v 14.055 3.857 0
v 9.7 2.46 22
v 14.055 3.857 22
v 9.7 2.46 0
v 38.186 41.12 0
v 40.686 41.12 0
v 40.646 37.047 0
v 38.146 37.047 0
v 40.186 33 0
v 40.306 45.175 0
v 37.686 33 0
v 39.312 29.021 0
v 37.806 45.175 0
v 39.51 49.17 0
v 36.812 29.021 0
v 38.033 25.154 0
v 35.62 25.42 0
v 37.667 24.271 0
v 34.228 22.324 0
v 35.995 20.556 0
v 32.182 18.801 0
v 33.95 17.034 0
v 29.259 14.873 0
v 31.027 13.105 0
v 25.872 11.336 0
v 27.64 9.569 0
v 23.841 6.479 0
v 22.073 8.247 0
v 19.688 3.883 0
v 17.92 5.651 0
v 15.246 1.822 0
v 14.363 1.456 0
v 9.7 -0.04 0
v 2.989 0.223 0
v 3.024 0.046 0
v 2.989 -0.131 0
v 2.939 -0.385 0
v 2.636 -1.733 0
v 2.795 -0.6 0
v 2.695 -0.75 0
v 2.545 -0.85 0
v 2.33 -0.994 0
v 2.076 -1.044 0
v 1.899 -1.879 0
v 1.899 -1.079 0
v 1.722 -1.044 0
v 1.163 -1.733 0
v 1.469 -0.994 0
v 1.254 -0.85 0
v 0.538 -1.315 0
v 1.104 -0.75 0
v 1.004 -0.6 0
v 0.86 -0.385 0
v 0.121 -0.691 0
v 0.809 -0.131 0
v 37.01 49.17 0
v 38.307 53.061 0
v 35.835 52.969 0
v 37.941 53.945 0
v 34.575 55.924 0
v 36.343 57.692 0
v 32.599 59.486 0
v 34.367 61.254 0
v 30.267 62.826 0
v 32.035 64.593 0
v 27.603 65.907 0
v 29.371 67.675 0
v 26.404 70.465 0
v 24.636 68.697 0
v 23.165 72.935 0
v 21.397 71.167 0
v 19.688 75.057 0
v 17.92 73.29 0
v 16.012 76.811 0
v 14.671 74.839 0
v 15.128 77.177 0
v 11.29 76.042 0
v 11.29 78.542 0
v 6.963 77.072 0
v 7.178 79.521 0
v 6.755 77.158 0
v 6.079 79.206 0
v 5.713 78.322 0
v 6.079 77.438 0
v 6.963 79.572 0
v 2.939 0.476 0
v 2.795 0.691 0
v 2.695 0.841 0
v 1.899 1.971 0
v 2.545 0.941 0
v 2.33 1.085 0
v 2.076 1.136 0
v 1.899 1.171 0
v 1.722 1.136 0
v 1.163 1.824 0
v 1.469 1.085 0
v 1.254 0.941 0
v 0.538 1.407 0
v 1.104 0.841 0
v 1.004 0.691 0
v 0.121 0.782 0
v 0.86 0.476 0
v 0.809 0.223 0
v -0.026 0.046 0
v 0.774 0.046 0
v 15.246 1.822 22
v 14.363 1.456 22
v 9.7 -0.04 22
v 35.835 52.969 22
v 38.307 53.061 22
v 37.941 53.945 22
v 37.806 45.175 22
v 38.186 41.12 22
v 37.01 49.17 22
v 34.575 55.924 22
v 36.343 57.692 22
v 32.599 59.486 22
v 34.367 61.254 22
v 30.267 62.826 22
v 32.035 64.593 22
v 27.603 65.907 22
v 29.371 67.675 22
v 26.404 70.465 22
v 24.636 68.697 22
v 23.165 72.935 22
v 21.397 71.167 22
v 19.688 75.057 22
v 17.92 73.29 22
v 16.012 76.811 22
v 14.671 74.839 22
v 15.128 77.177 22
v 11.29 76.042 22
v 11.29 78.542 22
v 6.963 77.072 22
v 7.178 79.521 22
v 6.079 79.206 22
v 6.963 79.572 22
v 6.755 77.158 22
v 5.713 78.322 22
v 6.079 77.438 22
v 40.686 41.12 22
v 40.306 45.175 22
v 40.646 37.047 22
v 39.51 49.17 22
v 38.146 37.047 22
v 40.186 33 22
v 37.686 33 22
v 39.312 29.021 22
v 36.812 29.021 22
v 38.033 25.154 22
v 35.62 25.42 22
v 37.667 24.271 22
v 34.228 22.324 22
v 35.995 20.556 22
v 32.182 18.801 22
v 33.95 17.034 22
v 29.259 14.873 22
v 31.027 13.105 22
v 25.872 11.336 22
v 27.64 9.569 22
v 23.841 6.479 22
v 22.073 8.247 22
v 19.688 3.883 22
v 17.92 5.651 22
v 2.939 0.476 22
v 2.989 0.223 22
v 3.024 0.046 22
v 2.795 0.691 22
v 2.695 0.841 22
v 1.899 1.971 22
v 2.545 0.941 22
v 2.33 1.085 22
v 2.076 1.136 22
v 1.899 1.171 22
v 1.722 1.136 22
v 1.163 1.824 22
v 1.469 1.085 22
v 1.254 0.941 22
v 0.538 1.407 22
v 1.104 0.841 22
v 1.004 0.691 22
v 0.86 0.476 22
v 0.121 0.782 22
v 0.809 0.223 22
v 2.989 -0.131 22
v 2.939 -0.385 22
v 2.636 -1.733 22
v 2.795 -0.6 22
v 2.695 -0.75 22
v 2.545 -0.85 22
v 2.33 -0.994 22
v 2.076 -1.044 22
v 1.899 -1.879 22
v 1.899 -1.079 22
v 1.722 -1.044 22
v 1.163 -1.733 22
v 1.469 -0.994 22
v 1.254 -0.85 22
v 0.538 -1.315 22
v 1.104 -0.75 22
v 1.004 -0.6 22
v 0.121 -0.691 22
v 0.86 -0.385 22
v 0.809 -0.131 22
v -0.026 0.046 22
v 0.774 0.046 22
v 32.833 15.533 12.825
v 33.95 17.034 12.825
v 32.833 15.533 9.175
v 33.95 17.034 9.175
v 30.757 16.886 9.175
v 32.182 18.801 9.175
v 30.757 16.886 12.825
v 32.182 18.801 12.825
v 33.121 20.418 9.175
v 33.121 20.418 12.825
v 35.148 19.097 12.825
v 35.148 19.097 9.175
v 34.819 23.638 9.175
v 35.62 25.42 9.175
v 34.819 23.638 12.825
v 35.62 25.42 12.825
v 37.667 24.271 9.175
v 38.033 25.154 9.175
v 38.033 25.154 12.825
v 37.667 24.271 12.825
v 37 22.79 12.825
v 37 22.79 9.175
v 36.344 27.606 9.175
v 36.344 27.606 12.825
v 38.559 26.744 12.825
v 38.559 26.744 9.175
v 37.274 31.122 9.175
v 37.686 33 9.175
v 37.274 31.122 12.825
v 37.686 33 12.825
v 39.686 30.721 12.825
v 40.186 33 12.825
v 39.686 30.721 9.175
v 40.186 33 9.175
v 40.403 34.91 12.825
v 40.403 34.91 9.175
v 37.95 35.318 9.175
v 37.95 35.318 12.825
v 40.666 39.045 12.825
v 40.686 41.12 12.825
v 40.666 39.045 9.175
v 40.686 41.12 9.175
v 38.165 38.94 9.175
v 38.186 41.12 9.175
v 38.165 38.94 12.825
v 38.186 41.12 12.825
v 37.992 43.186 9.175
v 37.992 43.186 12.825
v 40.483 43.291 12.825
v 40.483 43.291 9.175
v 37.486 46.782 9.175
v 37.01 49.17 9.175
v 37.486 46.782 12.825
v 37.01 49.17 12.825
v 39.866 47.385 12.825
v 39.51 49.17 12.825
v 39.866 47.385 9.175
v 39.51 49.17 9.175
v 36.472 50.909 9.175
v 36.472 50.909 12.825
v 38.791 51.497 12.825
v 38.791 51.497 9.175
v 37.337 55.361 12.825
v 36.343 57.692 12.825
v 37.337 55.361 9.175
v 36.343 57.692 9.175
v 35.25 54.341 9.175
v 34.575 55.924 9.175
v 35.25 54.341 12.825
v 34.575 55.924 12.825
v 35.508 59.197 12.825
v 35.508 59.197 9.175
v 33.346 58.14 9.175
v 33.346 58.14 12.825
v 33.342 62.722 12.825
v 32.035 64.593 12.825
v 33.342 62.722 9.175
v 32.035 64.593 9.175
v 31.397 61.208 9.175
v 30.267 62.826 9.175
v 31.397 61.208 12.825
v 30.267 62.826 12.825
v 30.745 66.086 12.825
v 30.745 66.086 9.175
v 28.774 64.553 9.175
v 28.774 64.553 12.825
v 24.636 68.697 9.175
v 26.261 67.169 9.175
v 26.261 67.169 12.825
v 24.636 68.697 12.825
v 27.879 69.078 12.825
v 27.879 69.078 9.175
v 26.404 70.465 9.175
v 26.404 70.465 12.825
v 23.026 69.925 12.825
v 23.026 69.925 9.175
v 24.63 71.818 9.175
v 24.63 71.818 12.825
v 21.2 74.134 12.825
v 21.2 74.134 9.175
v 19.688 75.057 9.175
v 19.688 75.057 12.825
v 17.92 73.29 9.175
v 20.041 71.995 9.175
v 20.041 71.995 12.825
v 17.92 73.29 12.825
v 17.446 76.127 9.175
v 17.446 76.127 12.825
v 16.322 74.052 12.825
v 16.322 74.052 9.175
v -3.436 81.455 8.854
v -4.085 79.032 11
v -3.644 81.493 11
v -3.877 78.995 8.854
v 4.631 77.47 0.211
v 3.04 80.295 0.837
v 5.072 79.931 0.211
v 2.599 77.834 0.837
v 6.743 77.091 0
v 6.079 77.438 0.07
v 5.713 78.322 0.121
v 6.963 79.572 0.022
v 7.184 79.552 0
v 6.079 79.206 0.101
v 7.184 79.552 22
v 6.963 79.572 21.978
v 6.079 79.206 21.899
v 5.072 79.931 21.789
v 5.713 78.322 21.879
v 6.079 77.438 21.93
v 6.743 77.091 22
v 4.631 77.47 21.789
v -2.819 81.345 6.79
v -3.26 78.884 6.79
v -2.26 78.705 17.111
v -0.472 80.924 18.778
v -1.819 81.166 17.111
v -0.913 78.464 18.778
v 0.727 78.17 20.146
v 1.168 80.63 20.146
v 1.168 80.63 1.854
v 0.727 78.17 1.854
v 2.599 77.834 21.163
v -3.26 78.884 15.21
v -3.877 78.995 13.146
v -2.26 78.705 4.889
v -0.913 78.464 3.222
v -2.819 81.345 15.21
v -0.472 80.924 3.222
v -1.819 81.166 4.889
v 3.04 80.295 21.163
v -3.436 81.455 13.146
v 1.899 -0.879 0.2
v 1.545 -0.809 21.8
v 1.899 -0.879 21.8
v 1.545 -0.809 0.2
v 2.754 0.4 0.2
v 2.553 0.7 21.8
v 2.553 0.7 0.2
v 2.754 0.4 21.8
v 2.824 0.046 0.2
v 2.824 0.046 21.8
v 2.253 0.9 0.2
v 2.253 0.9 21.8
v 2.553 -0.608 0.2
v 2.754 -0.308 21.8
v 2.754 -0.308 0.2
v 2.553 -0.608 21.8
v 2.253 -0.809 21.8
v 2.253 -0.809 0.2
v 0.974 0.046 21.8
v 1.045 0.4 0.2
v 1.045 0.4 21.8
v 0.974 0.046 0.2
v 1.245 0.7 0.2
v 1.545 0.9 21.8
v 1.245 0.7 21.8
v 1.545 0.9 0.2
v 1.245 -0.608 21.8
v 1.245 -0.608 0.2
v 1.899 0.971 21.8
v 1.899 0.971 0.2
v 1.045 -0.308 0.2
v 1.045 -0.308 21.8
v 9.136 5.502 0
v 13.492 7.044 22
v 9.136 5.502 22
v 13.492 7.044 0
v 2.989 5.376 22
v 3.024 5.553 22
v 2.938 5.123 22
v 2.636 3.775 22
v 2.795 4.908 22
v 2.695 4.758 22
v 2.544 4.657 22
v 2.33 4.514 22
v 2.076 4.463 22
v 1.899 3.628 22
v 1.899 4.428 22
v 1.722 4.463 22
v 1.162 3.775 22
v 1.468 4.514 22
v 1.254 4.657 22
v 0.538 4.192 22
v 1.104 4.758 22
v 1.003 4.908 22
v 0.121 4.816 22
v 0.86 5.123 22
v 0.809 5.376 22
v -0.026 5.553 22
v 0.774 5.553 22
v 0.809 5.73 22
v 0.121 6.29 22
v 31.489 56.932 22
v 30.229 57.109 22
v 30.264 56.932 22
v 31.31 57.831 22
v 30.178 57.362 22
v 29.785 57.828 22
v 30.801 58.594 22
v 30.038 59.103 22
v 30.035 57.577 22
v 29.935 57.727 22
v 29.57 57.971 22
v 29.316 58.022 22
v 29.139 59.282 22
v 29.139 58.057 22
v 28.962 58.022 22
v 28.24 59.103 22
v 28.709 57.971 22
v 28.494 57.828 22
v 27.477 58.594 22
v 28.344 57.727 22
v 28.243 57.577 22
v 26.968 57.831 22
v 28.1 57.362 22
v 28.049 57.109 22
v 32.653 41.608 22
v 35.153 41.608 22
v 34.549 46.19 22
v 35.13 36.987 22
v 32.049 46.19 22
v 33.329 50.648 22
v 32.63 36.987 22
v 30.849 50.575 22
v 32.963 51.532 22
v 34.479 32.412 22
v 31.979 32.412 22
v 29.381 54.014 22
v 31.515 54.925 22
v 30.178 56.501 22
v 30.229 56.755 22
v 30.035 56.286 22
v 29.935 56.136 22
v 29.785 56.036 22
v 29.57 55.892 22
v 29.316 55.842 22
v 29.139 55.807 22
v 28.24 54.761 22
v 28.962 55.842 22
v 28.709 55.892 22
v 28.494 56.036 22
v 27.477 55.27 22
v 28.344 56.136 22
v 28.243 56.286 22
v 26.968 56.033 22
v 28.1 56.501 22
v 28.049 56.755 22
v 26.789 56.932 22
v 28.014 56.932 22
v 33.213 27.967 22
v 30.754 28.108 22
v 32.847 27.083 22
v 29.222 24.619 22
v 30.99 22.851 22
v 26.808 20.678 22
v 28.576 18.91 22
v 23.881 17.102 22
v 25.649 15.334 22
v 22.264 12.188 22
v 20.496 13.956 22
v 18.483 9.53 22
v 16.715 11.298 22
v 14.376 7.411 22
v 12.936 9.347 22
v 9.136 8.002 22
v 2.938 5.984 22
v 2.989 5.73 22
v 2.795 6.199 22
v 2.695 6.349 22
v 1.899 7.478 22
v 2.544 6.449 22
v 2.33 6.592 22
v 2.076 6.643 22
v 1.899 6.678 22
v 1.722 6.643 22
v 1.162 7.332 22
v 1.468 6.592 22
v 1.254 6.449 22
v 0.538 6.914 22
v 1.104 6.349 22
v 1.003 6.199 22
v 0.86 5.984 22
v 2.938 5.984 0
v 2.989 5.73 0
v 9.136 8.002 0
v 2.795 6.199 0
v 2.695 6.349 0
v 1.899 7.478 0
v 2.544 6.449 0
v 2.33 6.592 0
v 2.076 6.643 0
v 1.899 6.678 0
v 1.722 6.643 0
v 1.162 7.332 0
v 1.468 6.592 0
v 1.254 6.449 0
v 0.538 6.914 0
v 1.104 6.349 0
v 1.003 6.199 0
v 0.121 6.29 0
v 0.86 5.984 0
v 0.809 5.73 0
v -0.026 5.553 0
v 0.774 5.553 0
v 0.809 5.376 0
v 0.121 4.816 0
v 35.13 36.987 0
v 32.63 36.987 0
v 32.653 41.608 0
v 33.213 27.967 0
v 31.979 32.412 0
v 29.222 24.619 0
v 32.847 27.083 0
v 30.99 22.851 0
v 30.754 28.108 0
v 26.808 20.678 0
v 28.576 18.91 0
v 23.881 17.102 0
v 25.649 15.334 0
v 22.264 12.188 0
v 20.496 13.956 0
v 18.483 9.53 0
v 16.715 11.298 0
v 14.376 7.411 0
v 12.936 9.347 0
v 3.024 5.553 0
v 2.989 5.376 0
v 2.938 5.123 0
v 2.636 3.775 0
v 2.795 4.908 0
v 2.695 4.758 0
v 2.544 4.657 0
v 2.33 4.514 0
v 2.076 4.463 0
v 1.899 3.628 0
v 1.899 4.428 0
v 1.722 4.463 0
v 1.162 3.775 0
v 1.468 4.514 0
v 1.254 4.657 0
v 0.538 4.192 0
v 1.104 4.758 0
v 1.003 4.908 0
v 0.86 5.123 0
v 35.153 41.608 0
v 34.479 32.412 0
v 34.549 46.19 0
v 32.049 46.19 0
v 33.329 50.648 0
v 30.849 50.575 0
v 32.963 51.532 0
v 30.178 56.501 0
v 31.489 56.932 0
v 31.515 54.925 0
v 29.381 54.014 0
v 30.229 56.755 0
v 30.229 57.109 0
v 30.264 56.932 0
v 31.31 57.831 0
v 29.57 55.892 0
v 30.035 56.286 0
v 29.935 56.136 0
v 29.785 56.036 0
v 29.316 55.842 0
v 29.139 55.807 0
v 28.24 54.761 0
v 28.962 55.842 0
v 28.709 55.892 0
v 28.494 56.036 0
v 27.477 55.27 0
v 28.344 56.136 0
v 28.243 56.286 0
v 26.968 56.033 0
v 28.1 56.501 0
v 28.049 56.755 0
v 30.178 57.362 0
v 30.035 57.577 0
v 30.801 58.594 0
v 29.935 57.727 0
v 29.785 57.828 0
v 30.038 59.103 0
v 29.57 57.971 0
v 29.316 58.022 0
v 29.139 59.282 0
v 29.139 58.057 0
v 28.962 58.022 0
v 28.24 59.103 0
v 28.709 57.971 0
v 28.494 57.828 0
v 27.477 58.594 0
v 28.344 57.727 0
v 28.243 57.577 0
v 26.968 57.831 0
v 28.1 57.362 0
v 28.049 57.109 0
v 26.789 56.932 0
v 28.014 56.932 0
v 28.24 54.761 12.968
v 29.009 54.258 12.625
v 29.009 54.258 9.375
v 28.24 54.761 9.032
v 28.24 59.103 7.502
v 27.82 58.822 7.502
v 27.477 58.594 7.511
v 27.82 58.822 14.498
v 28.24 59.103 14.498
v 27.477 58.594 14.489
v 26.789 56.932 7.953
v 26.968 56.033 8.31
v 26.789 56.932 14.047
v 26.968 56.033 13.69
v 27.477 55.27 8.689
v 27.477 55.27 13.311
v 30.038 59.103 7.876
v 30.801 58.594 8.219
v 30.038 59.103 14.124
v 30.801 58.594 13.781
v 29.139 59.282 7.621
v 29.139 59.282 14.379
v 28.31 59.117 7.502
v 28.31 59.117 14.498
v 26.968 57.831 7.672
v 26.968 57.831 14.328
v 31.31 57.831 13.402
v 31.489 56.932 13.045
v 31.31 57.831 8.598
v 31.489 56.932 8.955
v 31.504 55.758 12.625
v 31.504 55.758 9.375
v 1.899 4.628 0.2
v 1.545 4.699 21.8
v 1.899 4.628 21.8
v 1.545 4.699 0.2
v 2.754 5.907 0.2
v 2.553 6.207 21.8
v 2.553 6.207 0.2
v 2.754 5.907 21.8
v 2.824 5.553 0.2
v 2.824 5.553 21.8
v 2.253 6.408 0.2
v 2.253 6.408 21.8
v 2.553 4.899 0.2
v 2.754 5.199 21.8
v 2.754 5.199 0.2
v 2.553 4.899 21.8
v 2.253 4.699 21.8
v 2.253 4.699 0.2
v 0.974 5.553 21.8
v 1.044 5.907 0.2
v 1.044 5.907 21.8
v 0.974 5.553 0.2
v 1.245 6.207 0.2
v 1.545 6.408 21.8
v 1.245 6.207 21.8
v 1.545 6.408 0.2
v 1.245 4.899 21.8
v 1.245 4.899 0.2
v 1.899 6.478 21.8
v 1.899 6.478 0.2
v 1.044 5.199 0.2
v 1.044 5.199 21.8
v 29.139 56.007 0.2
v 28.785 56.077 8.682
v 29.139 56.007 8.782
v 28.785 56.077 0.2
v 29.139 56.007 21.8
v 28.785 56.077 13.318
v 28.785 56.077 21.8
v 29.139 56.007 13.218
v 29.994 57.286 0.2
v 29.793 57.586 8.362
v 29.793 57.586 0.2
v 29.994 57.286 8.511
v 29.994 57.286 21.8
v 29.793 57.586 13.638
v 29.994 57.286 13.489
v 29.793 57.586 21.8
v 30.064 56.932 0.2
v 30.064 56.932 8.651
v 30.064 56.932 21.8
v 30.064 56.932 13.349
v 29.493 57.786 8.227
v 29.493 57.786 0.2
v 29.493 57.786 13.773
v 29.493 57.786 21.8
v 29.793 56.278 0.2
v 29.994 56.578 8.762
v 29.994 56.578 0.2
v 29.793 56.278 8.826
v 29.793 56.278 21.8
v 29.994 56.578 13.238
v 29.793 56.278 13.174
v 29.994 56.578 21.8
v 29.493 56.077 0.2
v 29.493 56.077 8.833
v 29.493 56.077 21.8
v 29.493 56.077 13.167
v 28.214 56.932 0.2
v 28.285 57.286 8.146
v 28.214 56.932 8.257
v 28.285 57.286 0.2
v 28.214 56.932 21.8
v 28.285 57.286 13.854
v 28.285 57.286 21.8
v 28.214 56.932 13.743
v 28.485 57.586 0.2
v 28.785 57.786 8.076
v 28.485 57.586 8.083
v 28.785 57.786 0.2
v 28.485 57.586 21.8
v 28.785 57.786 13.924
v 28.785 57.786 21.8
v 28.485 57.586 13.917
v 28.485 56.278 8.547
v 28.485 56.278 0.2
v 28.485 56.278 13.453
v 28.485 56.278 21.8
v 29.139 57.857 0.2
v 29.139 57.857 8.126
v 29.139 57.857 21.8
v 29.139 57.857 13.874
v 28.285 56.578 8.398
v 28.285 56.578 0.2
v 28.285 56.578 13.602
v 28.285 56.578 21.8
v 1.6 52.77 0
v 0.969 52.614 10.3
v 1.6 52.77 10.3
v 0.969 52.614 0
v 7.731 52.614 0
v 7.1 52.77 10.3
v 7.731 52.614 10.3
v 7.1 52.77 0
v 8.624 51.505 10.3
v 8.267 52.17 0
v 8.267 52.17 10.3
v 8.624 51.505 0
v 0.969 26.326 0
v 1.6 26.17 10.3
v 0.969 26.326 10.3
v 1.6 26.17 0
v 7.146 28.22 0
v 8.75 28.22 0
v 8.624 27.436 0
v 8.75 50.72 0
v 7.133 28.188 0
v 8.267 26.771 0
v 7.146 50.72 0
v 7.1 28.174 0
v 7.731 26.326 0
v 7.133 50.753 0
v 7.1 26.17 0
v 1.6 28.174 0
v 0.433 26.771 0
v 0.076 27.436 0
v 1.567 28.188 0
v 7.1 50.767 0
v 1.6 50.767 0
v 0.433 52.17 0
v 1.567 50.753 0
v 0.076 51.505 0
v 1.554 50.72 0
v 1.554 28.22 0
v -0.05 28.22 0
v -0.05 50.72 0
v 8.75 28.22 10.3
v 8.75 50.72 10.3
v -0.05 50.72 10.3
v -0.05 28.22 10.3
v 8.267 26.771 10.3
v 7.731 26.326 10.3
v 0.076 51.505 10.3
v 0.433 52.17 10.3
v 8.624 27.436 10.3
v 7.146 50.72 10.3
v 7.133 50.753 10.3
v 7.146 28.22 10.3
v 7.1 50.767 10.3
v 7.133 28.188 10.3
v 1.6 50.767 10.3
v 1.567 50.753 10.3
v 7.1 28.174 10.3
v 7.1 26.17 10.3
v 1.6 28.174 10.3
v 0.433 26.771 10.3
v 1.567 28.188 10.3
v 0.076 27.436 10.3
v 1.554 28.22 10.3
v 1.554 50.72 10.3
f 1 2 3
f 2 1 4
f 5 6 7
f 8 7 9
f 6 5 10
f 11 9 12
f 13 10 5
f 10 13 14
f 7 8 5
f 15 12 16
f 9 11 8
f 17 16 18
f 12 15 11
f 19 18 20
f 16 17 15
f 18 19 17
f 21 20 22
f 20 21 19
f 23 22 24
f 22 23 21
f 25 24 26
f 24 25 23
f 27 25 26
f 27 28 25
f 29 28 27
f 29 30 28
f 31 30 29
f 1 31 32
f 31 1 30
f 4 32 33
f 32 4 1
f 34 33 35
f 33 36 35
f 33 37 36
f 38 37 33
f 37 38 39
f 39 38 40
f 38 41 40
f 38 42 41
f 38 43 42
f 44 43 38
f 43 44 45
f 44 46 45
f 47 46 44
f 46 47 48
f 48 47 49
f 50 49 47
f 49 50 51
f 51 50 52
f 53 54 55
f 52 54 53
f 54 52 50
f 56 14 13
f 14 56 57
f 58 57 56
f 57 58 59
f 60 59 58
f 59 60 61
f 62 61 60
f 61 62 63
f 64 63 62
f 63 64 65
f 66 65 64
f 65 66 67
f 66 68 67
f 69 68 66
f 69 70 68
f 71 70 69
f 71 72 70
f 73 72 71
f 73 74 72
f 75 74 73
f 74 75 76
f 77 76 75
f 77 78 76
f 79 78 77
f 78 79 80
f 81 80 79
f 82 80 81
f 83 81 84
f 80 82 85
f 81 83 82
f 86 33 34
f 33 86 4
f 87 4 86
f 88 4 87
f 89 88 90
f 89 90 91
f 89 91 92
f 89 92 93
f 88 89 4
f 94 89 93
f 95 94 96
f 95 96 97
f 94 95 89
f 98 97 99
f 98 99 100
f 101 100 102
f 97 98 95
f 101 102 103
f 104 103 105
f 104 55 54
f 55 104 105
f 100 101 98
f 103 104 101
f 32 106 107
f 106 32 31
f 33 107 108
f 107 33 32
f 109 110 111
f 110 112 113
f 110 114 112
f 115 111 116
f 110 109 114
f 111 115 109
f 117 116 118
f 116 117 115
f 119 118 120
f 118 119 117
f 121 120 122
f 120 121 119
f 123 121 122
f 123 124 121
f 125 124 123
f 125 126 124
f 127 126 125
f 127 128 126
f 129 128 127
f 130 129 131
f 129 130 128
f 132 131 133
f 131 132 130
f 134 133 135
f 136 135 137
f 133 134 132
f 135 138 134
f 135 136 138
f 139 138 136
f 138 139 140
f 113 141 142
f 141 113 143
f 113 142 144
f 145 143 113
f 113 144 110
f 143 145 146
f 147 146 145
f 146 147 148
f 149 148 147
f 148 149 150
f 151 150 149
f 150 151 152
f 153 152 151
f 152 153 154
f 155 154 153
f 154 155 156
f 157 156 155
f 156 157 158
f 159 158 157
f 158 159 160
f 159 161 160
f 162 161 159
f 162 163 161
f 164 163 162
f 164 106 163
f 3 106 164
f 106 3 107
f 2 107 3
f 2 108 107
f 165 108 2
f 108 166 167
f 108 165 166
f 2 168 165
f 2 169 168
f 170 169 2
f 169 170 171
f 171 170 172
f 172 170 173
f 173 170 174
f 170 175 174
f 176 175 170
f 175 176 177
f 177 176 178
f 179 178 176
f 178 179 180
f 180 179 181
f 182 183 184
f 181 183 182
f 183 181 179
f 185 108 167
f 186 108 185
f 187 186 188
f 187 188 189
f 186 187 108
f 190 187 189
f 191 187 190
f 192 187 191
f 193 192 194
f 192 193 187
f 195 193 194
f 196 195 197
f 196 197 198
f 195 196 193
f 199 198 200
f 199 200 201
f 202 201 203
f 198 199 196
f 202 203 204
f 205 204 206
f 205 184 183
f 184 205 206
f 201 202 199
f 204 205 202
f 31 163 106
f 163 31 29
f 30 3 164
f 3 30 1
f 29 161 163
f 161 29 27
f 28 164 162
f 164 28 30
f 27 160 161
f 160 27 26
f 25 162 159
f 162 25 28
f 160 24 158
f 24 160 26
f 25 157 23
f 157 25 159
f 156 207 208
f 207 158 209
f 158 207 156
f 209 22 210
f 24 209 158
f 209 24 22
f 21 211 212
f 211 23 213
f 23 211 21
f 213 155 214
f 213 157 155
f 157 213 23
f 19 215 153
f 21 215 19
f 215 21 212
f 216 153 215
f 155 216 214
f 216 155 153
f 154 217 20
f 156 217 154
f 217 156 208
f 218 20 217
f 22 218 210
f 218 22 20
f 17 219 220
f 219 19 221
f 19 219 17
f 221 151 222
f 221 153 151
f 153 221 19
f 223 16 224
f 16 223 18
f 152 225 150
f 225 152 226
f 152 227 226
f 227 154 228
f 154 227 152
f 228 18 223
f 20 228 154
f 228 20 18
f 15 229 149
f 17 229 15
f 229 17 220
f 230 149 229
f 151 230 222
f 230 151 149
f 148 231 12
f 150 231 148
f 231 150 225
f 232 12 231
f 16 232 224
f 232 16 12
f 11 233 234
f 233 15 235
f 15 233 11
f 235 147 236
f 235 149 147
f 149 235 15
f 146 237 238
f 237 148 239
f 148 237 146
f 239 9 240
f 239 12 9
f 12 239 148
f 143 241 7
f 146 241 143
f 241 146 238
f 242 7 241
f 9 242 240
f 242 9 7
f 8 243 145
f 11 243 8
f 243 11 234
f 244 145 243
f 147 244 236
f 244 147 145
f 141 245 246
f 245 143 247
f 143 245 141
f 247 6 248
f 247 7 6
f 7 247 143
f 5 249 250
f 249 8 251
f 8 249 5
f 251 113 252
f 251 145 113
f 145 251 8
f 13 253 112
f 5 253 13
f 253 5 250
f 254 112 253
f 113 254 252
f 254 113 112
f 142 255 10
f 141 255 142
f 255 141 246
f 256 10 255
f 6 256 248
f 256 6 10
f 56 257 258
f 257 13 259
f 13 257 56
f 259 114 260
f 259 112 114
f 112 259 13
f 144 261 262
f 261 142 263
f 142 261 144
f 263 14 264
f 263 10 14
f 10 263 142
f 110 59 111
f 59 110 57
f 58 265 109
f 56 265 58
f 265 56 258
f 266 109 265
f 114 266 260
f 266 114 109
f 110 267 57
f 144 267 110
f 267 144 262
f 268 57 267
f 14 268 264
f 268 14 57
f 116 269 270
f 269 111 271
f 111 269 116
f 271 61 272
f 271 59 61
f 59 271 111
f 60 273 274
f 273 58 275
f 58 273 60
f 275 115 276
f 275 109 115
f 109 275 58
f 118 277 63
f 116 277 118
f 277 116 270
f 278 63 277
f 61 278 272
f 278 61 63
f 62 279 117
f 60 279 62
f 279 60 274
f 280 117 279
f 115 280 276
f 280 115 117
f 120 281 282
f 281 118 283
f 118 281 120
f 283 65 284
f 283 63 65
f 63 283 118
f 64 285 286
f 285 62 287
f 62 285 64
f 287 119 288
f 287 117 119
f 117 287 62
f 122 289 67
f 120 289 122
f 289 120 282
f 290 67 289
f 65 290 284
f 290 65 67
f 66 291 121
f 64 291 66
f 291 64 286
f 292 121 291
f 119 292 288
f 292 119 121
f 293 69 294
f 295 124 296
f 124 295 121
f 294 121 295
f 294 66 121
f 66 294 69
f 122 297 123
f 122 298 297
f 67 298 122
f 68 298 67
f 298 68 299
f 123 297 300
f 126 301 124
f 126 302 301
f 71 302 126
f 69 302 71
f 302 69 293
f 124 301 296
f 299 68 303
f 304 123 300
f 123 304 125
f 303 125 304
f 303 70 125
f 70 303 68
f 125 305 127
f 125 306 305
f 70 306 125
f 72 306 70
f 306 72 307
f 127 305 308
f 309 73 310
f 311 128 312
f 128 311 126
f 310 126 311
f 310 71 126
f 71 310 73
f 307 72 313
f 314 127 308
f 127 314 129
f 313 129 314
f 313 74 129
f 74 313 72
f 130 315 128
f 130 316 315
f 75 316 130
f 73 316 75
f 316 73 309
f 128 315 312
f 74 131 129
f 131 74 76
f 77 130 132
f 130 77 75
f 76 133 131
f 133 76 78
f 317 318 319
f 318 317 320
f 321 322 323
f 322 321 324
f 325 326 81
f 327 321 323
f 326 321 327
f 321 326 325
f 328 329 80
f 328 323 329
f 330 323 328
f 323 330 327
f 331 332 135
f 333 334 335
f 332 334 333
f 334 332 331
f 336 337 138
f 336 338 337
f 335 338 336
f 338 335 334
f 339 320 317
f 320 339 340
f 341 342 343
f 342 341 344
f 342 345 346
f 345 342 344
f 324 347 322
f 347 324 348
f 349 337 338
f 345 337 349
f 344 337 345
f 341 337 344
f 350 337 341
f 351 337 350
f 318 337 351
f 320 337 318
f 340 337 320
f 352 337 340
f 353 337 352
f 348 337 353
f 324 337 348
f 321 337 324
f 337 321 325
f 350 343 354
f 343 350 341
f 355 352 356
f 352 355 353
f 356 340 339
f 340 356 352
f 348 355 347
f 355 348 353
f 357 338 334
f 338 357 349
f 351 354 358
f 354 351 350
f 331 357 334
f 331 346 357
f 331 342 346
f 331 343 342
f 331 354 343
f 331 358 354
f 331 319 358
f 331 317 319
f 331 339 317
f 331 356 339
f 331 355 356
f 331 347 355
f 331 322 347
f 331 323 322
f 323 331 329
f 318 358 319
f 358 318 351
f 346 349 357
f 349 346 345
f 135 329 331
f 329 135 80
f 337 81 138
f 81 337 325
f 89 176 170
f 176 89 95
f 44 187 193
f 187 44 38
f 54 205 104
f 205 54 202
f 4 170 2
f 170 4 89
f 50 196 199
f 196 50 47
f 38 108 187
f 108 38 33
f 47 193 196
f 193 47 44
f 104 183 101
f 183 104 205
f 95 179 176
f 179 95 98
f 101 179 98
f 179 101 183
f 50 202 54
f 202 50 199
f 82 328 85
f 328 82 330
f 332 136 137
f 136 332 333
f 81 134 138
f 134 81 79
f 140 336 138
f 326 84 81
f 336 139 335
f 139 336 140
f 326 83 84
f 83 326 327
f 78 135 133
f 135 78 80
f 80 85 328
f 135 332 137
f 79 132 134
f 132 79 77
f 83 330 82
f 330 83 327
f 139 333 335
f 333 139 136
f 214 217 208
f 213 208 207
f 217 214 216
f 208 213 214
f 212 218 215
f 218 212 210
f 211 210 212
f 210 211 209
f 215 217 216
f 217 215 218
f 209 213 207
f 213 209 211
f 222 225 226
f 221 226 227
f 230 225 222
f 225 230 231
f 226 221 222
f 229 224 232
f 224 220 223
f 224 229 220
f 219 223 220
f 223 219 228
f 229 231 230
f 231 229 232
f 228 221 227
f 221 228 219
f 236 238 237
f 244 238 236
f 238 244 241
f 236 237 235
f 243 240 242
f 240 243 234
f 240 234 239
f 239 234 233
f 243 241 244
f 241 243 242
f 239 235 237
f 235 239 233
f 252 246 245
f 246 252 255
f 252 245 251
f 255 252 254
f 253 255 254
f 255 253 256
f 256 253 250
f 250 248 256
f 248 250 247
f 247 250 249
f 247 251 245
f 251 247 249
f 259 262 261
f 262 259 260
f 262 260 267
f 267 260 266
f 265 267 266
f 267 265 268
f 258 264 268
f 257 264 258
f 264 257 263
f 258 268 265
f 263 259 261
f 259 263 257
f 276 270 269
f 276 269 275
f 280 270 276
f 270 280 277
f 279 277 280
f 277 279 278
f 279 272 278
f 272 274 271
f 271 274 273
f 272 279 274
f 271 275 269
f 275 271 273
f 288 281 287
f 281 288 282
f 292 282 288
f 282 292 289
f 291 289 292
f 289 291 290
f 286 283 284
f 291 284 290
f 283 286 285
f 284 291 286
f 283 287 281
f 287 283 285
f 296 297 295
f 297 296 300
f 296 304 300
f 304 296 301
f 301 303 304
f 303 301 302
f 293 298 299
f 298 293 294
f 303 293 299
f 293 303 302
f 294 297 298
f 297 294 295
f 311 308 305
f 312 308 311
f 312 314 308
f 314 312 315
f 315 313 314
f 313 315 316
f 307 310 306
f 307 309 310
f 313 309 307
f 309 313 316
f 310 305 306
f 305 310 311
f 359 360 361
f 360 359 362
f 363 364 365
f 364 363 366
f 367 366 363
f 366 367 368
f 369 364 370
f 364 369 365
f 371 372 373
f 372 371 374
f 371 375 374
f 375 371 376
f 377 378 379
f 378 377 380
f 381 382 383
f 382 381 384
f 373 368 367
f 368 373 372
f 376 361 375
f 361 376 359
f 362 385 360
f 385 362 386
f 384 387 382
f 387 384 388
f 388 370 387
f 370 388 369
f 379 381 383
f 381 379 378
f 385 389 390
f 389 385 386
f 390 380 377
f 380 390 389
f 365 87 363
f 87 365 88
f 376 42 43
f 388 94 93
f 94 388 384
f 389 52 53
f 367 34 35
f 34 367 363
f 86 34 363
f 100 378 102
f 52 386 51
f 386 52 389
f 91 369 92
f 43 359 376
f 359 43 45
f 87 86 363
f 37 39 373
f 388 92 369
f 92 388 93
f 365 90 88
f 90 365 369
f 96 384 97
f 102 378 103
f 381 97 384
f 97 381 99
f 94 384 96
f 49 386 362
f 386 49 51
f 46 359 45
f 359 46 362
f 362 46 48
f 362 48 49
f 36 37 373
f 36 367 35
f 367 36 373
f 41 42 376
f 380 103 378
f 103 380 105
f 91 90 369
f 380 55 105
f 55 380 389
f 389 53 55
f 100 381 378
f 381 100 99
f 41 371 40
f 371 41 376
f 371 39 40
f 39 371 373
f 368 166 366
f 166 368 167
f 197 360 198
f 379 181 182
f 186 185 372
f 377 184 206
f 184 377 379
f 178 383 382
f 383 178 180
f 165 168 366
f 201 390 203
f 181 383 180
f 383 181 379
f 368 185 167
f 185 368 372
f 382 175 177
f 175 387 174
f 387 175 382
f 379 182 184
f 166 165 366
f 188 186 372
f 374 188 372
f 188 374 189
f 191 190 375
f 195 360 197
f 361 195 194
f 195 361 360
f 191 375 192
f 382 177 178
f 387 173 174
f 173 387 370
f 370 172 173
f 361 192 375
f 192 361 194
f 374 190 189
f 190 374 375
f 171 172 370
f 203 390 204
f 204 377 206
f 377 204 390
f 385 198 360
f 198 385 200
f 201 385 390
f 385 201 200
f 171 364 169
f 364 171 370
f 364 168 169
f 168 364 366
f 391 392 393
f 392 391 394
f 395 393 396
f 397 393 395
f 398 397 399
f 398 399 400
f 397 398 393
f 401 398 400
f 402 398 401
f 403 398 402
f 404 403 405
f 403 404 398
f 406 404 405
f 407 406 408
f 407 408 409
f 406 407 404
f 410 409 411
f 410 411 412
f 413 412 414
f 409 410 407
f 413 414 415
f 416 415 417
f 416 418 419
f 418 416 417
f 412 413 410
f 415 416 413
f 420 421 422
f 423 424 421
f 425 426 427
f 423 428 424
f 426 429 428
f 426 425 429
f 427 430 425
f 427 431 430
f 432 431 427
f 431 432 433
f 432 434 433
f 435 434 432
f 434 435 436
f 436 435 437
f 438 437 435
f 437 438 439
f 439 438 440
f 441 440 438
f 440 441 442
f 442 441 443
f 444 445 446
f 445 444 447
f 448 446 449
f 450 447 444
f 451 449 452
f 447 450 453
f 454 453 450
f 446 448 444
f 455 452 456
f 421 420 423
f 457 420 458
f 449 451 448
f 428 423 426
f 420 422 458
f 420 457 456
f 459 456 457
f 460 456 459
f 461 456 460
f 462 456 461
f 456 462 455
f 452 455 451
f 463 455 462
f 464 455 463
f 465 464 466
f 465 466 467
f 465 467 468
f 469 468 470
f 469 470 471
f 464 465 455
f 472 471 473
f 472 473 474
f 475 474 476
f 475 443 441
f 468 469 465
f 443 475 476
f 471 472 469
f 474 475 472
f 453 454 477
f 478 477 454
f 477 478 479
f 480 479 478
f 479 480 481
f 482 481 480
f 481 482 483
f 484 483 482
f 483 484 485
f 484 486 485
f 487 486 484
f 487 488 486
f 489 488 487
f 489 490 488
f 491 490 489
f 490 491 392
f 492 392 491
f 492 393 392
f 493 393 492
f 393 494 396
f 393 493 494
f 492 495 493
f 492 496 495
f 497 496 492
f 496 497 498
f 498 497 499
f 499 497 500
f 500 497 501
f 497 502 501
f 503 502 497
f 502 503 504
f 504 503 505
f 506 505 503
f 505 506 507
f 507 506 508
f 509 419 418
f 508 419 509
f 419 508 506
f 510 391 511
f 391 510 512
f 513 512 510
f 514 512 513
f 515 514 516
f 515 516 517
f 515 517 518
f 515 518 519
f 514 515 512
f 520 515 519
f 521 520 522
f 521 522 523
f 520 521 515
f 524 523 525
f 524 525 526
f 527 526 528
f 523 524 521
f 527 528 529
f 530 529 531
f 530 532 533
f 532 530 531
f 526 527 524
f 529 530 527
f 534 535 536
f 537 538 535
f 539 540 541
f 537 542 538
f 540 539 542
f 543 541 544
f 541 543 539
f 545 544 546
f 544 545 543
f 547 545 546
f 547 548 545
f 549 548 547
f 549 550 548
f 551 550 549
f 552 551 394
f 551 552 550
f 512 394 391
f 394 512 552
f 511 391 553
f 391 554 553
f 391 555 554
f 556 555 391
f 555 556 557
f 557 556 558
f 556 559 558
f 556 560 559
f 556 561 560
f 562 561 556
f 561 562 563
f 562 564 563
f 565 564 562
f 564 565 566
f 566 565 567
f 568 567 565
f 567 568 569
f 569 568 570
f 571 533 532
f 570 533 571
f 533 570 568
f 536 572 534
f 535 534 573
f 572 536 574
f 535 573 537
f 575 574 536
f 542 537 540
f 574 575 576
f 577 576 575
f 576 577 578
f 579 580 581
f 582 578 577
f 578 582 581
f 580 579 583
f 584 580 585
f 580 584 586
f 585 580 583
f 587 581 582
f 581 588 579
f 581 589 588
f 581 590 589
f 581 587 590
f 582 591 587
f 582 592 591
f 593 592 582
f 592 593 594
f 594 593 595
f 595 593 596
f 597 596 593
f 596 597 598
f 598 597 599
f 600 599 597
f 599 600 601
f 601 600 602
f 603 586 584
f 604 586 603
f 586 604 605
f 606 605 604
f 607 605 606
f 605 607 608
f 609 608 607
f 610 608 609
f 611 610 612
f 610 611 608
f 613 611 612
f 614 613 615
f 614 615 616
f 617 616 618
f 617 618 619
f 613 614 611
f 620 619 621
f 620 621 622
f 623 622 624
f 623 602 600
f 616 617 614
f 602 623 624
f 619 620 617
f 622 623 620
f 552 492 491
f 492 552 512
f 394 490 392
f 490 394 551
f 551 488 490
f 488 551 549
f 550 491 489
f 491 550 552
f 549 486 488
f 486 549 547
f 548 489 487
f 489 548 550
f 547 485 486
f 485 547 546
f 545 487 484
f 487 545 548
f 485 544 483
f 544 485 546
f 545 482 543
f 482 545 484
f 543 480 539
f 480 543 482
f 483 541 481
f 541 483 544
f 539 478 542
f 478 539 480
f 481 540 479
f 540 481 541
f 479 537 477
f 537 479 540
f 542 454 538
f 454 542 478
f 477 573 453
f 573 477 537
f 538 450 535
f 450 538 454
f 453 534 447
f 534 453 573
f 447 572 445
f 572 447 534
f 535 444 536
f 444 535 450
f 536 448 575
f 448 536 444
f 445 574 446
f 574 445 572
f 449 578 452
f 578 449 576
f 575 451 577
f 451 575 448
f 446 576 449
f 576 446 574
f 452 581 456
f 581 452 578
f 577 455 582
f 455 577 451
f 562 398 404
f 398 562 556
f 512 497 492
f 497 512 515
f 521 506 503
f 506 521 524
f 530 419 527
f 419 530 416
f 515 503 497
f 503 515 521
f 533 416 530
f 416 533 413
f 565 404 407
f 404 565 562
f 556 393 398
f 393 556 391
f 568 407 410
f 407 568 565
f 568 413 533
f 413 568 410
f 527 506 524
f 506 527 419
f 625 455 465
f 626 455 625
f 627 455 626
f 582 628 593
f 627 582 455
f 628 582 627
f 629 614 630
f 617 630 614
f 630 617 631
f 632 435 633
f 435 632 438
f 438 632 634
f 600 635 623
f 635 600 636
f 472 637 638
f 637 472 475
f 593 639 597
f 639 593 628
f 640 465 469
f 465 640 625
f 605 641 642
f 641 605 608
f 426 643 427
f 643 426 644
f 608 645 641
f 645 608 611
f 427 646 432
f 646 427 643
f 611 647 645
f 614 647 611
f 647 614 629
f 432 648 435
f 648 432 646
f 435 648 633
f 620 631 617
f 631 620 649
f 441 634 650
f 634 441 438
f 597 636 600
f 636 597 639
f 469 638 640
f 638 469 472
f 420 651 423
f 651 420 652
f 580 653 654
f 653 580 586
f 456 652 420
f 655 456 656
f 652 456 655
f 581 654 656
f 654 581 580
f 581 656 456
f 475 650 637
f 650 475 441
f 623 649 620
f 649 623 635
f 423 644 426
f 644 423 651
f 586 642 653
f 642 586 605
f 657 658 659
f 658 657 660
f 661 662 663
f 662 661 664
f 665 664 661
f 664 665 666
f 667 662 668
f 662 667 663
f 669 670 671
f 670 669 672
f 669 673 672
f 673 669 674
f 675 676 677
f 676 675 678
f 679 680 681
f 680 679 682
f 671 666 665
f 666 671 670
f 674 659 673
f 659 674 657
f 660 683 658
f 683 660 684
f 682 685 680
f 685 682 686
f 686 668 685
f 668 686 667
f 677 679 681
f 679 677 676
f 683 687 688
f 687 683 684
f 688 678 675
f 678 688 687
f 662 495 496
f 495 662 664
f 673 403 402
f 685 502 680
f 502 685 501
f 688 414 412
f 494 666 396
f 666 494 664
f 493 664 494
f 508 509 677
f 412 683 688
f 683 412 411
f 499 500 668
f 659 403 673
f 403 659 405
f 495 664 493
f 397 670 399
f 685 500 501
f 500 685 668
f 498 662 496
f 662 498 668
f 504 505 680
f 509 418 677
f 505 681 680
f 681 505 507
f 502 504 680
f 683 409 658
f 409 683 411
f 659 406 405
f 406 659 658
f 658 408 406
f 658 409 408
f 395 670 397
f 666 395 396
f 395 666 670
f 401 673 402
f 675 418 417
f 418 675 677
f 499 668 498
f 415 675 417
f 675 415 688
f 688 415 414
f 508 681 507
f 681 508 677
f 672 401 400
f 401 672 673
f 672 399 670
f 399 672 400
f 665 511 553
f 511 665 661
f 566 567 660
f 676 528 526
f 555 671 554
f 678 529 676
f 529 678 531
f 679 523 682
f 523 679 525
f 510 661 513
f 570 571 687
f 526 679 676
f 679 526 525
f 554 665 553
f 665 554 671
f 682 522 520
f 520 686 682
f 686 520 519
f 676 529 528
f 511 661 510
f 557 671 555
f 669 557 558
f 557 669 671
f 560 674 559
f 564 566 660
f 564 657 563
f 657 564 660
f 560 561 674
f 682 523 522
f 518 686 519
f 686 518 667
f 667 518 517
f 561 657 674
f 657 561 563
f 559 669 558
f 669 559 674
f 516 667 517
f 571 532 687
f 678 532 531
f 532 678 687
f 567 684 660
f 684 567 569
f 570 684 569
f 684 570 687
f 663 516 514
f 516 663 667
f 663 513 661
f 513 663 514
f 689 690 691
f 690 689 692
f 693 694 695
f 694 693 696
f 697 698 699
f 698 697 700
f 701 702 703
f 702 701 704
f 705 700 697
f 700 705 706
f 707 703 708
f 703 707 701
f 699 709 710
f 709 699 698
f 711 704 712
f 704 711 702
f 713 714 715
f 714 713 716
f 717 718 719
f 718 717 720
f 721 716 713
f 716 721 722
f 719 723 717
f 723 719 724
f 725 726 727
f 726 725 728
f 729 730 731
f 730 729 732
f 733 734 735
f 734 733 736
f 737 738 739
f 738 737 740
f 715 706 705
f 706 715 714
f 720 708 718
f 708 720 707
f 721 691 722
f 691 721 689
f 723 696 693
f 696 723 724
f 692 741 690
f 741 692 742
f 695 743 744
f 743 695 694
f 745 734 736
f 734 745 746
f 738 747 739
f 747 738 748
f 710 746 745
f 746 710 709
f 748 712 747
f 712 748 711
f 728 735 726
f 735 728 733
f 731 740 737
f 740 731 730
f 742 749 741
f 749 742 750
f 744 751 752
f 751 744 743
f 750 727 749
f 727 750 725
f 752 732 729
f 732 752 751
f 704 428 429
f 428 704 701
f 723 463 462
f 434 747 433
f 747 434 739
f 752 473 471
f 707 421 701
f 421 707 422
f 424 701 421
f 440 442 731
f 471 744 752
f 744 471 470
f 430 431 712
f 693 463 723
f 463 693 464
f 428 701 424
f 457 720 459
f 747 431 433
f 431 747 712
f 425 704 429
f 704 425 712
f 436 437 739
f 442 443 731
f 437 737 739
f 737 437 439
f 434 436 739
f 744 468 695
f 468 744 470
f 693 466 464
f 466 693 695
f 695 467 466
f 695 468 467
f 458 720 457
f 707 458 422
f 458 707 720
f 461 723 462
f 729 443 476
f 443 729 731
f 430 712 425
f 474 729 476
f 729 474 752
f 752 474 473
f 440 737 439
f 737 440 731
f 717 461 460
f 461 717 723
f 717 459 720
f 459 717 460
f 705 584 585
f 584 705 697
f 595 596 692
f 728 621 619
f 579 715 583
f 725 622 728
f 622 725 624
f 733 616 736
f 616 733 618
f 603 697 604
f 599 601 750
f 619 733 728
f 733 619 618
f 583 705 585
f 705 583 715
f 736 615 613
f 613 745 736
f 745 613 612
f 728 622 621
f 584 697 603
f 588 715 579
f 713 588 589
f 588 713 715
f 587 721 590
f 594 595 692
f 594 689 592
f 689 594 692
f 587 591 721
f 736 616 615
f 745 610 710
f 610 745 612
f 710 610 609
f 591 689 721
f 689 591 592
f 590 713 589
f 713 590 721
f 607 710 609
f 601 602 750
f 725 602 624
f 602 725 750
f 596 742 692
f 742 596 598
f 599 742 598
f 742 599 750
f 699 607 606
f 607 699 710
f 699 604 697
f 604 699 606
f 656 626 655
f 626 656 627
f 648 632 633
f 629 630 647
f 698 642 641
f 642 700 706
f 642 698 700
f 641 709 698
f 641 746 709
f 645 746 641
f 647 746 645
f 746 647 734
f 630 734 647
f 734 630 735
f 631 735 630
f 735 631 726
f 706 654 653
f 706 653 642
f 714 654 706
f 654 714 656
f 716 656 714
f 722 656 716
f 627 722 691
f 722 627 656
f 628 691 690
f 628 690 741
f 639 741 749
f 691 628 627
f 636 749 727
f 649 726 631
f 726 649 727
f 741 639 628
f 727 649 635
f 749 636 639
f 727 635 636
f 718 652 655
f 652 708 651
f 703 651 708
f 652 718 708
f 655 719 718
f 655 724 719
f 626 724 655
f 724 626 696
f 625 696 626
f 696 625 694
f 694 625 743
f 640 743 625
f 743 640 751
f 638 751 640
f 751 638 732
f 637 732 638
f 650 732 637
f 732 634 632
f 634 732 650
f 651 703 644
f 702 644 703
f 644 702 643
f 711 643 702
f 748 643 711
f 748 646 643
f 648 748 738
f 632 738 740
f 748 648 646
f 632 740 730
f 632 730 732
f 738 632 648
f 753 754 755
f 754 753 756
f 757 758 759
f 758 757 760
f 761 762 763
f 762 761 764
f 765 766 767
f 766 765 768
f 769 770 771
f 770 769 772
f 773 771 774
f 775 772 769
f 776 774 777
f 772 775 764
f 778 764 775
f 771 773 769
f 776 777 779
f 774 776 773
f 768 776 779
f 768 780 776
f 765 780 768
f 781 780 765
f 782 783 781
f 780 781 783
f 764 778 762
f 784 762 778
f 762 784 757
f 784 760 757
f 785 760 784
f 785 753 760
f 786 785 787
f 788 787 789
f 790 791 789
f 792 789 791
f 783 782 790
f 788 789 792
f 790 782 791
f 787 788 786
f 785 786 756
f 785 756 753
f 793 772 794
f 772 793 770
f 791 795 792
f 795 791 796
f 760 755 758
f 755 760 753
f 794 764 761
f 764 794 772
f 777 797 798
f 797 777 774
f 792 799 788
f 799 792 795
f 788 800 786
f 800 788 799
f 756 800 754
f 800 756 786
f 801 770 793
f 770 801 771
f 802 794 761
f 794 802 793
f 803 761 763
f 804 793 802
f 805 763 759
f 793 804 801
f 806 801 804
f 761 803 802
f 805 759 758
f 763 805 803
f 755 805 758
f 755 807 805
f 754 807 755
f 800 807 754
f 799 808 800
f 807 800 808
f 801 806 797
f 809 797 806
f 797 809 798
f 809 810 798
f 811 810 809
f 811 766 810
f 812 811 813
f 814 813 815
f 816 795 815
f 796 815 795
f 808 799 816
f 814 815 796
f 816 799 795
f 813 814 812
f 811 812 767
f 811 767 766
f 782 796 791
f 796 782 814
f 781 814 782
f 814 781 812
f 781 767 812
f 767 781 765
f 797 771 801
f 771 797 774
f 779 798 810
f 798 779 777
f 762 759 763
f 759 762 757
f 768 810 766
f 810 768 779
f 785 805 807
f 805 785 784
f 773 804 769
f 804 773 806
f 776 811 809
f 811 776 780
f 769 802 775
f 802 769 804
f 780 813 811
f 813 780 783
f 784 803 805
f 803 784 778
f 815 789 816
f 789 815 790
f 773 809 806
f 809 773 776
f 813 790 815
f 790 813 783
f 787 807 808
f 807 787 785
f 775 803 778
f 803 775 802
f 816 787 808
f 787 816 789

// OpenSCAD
// file: ../utilities/circular.scad
// arc functions
test_module="test circle_point_at_length";


function pi()=3.14159265358979323846;

function circle_circumference(r)=2*pi()*r;

// angle=360*l/circle_circumference(r)
// r*[cos(angle),sin(angle)]
function circle_point_at_length(r,l,offset=[0,0],rotate=0)=[r*cos(rotate+360*l/circle_circumference(r))
    , r*sin(rotate+360*l/circle_circumference(r)) ]+offset;

subdivisions=10;
path_length=128;
if(test_module=="test circle_point_at_length") {
    for(i=[0:subdivisions],bend_r=[30:20:200]) translate([0,0,bend_r]) union() {
        translate( circle_point_at_length(bend_r,i*path_length/subdivisions,rotate=-90,offset=[0,bend_r] ) ) {
            color([i/subdivisions,i/subdivisions,i/subdivisions]) cylinder(r1=2,r2=0,h=4);
        }
        if(i>0) hull() {
            translate( circle_point_at_length(bend_r,(i-1)*path_length/subdivisions,rotate=-90,offset=[0,bend_r] ) ) {
                cube();
            }
            translate( circle_point_at_length(bend_r,i*path_length/subdivisions,rotate=-90,offset=[0,bend_r] ) ) {
                cube();
            }
        }
    }
}
// main file
// Watch Strap Modules
// Measurements taken from Kickstarter Pebble Watch
// Curved variant

use <../utilities/circular.scad>;

test_module="test watchstrap_adjustment_band";
test_module="test watchstrap_buckle_band";
test_module="test watchstrap_free_loop";
test_module="test plated";
//test_module="test shapeways";

global_min_wall_th=0.8;
global_min_clearance=0.5;
global_hole_grow=0.05;
global_hole_bevel=0.2;
global_overhang_angle=30.0;
global_debug=true;
global_emboss_delta=0.5;

adjustment_band_l=128.0;
adjustment_band_w=22.0;
adjustment_band_th=2.5;
adjustment_band_pin_d=1.8;
adjustment_band_pin_wall_th=1.0;
adjustment_band_hole_l=4.2;
adjustment_band_hole_w=3.6;
adjustment_band_hole_offset=37.10+adjustment_band_hole_l/2;
adjustment_band_hole_spacing=12.35-adjustment_band_hole_l;
adjustment_band_hole_count=9;

buckle_band_l=74.0;
buckle_band_w=adjustment_band_w;
buckle_band_th=adjustment_band_th;
buckle_band_pin_d=adjustment_band_pin_d;
buckle_band_pin_wall_th=adjustment_band_pin_wall_th;
buckle_tongue_hole_w=3.2;
buckle_tongue_hole_notch=4.5;
buckle_tongue_pin_d=adjustment_band_pin_d;
buckle_tongue_pin_wall_th=1.4;

free_loop_inner_h=5.5;
free_loop_inner_w=22.5;
free_loop_l=10.3;
free_loop_surface_wall_th=1.60;
free_loop_edge_wall_th=2.0;

watch_adjustment_to_band_spacing=44.2+adjustment_band_pin_d/2+buckle_band_pin_d/2;
adjustment_band_bend_r=(adjustment_band_l+buckle_band_l+watch_adjustment_to_band_spacing)/(2*pi());
buckle_band_bend_r=adjustment_band_bend_r-free_loop_inner_h;

module watchstrap_adjustment_band(l=adjustment_band_l
    ,bend_r=adjustment_band_bend_r
    ,band_offset=watch_adjustment_to_band_spacing/2
    ,w=adjustment_band_w
    ,th=adjustment_band_th
    ,pin_d=adjustment_band_pin_d
    ,pin_wall_th=adjustment_band_pin_wall_th
    ,hole_l=adjustment_band_hole_l
    ,hole_w=adjustment_band_hole_w
    ,hole_offset=adjustment_band_hole_offset
    ,hole_spacing=adjustment_band_hole_spacing
    ,hole_count=adjustment_band_hole_count
    ,hole_bevel=global_hole_bevel
    ,hole_grow=global_hole_grow
    ,min_wall_th=global_min_wall_th
    ,debug=global_debug
    ,anchor_hole_d=adjustment_band_w/4
) {
    if(debug) {
        echo("watchstrap_adjustment_band:");
        echo(str("            l = ",l));
        echo(str("       bend_r = ",bend_r));
        echo(str("  band_offset = ",band_offset));
        echo(str("            w = ",w));
        echo(str("           th = ",th));
        echo(str("        pin_d = ",pin_d));
        echo(str("  pin_wall_th = ",pin_wall_th));
        echo(str("       hole_l = ",hole_l));
        echo(str("       hole_w = ",hole_w));
        echo(str("  hole_offset = ",hole_offset));
        echo(str(" hole_spacing = ",hole_spacing));
        echo(str("   hole_count = ",hole_count));
        echo(str("   hole_bevel = ",hole_bevel));
        echo(str("    hole_grow = ",hole_grow));
        echo(str("  min_wall_th = ",min_wall_th));
    }
    difference() {
        union() {
            hull() {
                translate(circle_point_at_length(bend_r,pin_d/2+pin_wall_th+band_offset,rotate=-90,offset=[0,bend_r] )) {
                    cylinder(d=pin_d+2*pin_wall_th+hole_grow,h=w,$fn=16,center=true);
                }
                translate( circle_point_at_length(bend_r,2*hole_offset/8+band_offset,rotate=-90,offset=[0,bend_r] ) )
                        cylinder(d=th,h=w,center=true,$fn=8);
            }
            for(i=[3:8]) {
                hull() {
                    translate( circle_point_at_length(bend_r,(i-1)*hole_offset/8+band_offset,rotate=-90,offset=[0,bend_r] ) )
                        cylinder(d=th,h=w,center=true,$fn=8);
                    translate( circle_point_at_length(bend_r,i*hole_offset/8+band_offset,rotate=-90,offset=[0,bend_r] ) )
                        cylinder(d=th,h=w,center=true,$fn=8);
                }
            }
            for(i=[1:2*hole_count]) {
                hull() {
                    translate( circle_point_at_length(bend_r,hole_offset+(i-1)*hole_spacing/2+band_offset,rotate=-90,offset=[0,bend_r] ) )
                        cylinder(d=th,h=w,center=true,$fn=8);
                    translate( circle_point_at_length(bend_r,hole_offset+i*hole_spacing/2+band_offset,rotate=-90,offset=[0,bend_r] ) )
                        cylinder(d=th,h=w,center=true,$fn=8);
                }
            }
            strap_end=circle_point_at_length(bend_r,l-w/2+band_offset,rotate=-90,offset=[0,bend_r] );
            hull() {
                translate( circle_point_at_length(bend_r,hole_offset+hole_count*hole_spacing+band_offset,rotate=-90,offset=[0,bend_r] ) )
                    cylinder(d=th,h=w,center=true,$fn=8);
                translate( strap_end )
                    cylinder(d=th,h=w,center=true,$fn=8);
            }
            strap_end_for_angle=circle_point_at_length(bend_r,l-w/2+band_offset,rotate=-90,offset=[0,0] );
            strap_end_angle=atan2(strap_end_for_angle[1],strap_end_for_angle[0]);
            translate( strap_end ) {
                rotate([0,0,strap_end_angle]) rotate([0,90,0]) # intersection() {
                    cylinder(d=w,h=th,$fn=32,center=true);
                    translate([0,w/2,0]) cube([w,w,th],center=true);
                }
            }
        }
        for(i=[0:hole_count-1]) {
            hole_position=circle_point_at_length(bend_r,hole_offset+i*hole_spacing+band_offset,rotate=-90,offset=[0,bend_r] );
            hole_position_for_angle=circle_point_at_length(bend_r,hole_offset+i*hole_spacing+band_offset,rotate=-90,offset=[0,0] );
            hole_angle=atan2(hole_position_for_angle[1],hole_position_for_angle[0]);
            translate( hole_position ) {
                rotate([0,0,hole_angle]) # cube([3*th,hole_l+hole_grow,hole_w+hole_grow],center=true);
            }
        }
        translate(circle_point_at_length(bend_r,pin_d/2+pin_wall_th+band_offset,rotate=-90,offset=[0,bend_r] )) union() {
            cylinder(r=pin_d/2+hole_grow/2,h=w,$fn=16,center=true);
            translate([0,0,-w/2]) cylinder(r1=pin_d/2+2*hole_bevel+hole_grow/2,r2=pin_d/2+hole_grow/2,h=2*hole_bevel,center=true,$fn=16);
            translate([0,0,w/2]) cylinder(r2=pin_d/2+2*hole_bevel+hole_grow/2,r1=pin_d/2+hole_grow/2,h=2*hole_bevel,center=true,$fn=16);
        }
        # if(anchor_hole_d>0.0) render() {
            anchor_hole=circle_point_at_length(bend_r,band_offset+w/2,rotate=-90,offset=[0,bend_r]);
            anchor_hole_for_angle=circle_point_at_length(bend_r,band_offset+w/2,rotate=-90,offset=[0,0]);
            anchor_hole_angle=atan2(anchor_hole_for_angle[1],anchor_hole_for_angle[0]);
            translate( anchor_hole ) {
                rotate([0,0,anchor_hole_angle]) rotate([0,90,0]) intersection() {
                    union() {
                        cylinder(d=anchor_hole_d,h=3*th,$fn=16,center=true);
                        rotate([0,0,-45]) translate([0,0,-3*th/2]) cube([anchor_hole_d/2,anchor_hole_d/2,3*th],center=false);
                        rotate([0,0,180-45]) translate([0,0,-3*th/2]) cube([anchor_hole_d/2,anchor_hole_d/2,3*th],center=false);
                    }
                    cube([anchor_hole_d,anchor_hole_d,3*th],center=true);
                }
            }
        }
    }
}

if(test_module=="test watchstrap_adjustment_band") {
    echo("Testing watchstrap_adjustment_band");
    watchstrap_adjustment_band();
}


module watchstrap_buckle_band(l=buckle_band_l
    ,bend_r=buckle_band_bend_r
    ,band_offset=watch_adjustment_to_band_spacing/2
    ,w=buckle_band_w
    ,th=buckle_band_th
    ,pin_d=buckle_band_pin_d
    ,pin_wall_th=buckle_band_pin_wall_th
    ,tongue_hole_w=buckle_tongue_hole_w
    ,tongue_hole_notch=buckle_tongue_hole_notch
    ,tongue_pin_d=buckle_tongue_pin_d
    ,tongue_pin_wall_th=buckle_tongue_pin_wall_th
    ,hole_bevel=global_hole_bevel
    ,hole_grow=global_hole_grow
    ,overhang_angle=global_overhang_angle
    ,min_wall_th=global_min_wall_th
    ,debug=global_debug
    ,anchor_hole_d=buckle_band_w/4
) mirror([1,0]) {
    if(debug) {
        echo("watchstrap_buckle_band:");
        echo(str(" l = ",l));
        echo(str(" w = ",w));
        echo(str(" th = ",th));
        echo(str(" pin_d = ",pin_d));
        echo(str(" pin_wall_th = ",pin_wall_th));
        echo(str(" tongue_hole_w = ",tongue_hole_w));
        echo(str(" tongue_hole_notch = ",tongue_hole_notch));
        
    }
    difference() {
        union() {
            hull() {
                translate(circle_point_at_length(bend_r,pin_d/2+pin_wall_th+band_offset,rotate=-90,offset=[0,bend_r] )) {
                    cylinder(d=pin_d+2*pin_wall_th+hole_grow,h=w,$fn=16,center=true);
                }
                translate( circle_point_at_length(bend_r,2*l/16+band_offset,rotate=-90,offset=[0,bend_r] ) )
                        cylinder(d=th,h=w,center=true,$fn=8);
            }
            for(i=[3:15]) {
                hull() {
                    translate( circle_point_at_length(bend_r,(i-1)*l/16+band_offset,rotate=-90,offset=[0,bend_r] ) )
                        cylinder(d=th,h=w,center=true,$fn=8);
                    translate( circle_point_at_length(bend_r,i*l/16+band_offset,rotate=-90,offset=[0,bend_r] ) )
                        cylinder(d=th,h=w,center=true,$fn=8);
                }
            }
            hull() {
                translate( circle_point_at_length(bend_r,15*l/16+band_offset,rotate=-90,offset=[0,bend_r] ) )
                    cylinder(d=th,h=w,center=true,$fn=8);
                translate( circle_point_at_length(bend_r,l-tongue_pin_d/2-tongue_pin_wall_th+band_offset,rotate=-90,offset=[0,bend_r] ) )
                    cylinder(d=tongue_pin_d+2*tongue_pin_wall_th+2*hole_grow,h=w,$fn=16,center=true);
            }
        }
        translate(circle_point_at_length(bend_r,pin_d/2+pin_wall_th+band_offset,rotate=-90,offset=[0,bend_r] )) union() {
            cylinder(r=pin_d/2+hole_grow/2,h=w,$fn=16,center=true);
            translate([0,0,-w/2]) cylinder(r1=pin_d/2+2*hole_bevel+hole_grow/2,r2=pin_d/2+hole_grow/2,h=2*hole_bevel,center=true,$fn=16);
            translate([0,0,w/2]) cylinder(r2=pin_d/2+2*hole_bevel+hole_grow/2,r1=pin_d/2+hole_grow/2,h=2*hole_bevel,center=true,$fn=16);
        }
        translate( circle_point_at_length(bend_r,l-tongue_pin_d/2-tongue_pin_wall_th+band_offset,rotate=-90,offset=[0,bend_r] ) ) union() {
            cylinder(r=pin_d/2+hole_grow/2,h=w,$fn=16,center=true);
            translate([0,0,-w/2]) cylinder(r1=pin_d/2+2*hole_bevel+hole_grow/2,r2=pin_d/2+hole_grow/2,h=2*hole_bevel,center=true,$fn=16);
            translate([0,0,w/2]) cylinder(r2=pin_d/2+2*hole_bevel+hole_grow/2,r1=pin_d/2+hole_grow/2,h=2*hole_bevel,center=true,$fn=16);
        }
        strap_end=circle_point_at_length(bend_r,l-tongue_hole_notch/2+band_offset,rotate=-90,offset=[0,bend_r] );
        strap_end_for_angle=circle_point_at_length(bend_r,l-tongue_hole_notch/2+band_offset,rotate=-90,offset=[0,0] );
        strap_end_angle=atan2(strap_end_for_angle[1],strap_end_for_angle[0]);
        translate(strap_end) rotate([0,0,strap_end_angle+90]) rotate([90,0,0]) # hull() {
            cube([tongue_hole_notch+hole_grow,tongue_hole_w+hole_grow,tongue_pin_d+2*tongue_pin_wall_th+4*hole_grow],center=true);
            if(overhang_angle>0) {
                translate([tongue_hole_notch/2+th/2,0,0]) cube([th,tongue_hole_w+2*hole_grow+2*tan(overhang_angle)*tongue_hole_w,tongue_pin_d+2*tongue_pin_wall_th+4*hole_grow],center=true);
            }
        }
        # if(anchor_hole_d>0.0) render() {
            anchor_hole=circle_point_at_length(bend_r,band_offset+w/2,rotate=-90,offset=[0,bend_r]);
            anchor_hole_for_angle=circle_point_at_length(bend_r,band_offset+w/2,rotate=-90,offset=[0,0]);
            anchor_hole_angle=atan2(anchor_hole_for_angle[1],anchor_hole_for_angle[0]);
            translate( anchor_hole ) {
                rotate([0,0,anchor_hole_angle]) rotate([0,90,0]) intersection() {
                    union() {
                        cylinder(d=anchor_hole_d,h=3*th,$fn=16,center=true);
                        rotate([0,0,-45]) translate([0,0,-3*th/2]) cube([anchor_hole_d/2,anchor_hole_d/2,3*th],center=false);
                        rotate([0,0,180-45]) translate([0,0,-3*th/2]) cube([anchor_hole_d/2,anchor_hole_d/2,3*th],center=false);
                    }
                    cube([anchor_hole_d,anchor_hole_d,3*th],center=true);
                }
            }
        }
    }
}

if(test_module=="test watchstrap_buckle_band") {
    echo("Testing watchstrap_buckle_band");
    watchstrap_buckle_band();
}


module watchstrap_free_loop(inner_h=free_loop_inner_h
    ,inner_w=free_loop_inner_w
    ,l=free_loop_l
    ,surface_wall_th=free_loop_surface_wall_th
    ,edge_wall_th=free_loop_edge_wall_th
    ,hole_bevel=global_hole_bevel
    ,hole_grow=global_hole_grow
    ,min_wall_th=global_min_wall_th
) {
    difference() {
        hull() {
            translate([inner_h/2,inner_w/2,0]) scale([surface_wall_th+hole_grow,edge_wall_th+hole_grow,1.0]) cylinder(r=1.0,h=l,$fn=16,center=false);
            translate([inner_h/2,-inner_w/2,0]) scale([surface_wall_th+hole_grow,edge_wall_th+hole_grow,1.0]) cylinder(r=1.0,h=l,$fn=16,center=false);
            translate([-inner_h/2,-inner_w/2,0]) scale([surface_wall_th+hole_grow,edge_wall_th+hole_grow,1.0]) cylinder(r=1.0,h=l,$fn=16,center=false);
            translate([-inner_h/2,inner_w/2,0]) scale([surface_wall_th+hole_grow,edge_wall_th+hole_grow,1.0]) cylinder(r=1.0,h=l,$fn=16,center=false);
        }
        minkowski() {
            translate([0,0,l/2]) cube([inner_h,inner_w,l],center=true);
            sphere(r=hole_grow,$fn=8);
        }
    }
}

if(test_module=="test watchstrap_free_loop") {
    echo("Testing watchstrap_free_loop");
    watchstrap_free_loop();
}

if(test_module=="test plated") {
    spin_offset=$t*(adjustment_band_l+buckle_band_l+watch_adjustment_to_band_spacing);
    echo("Testing plating for printing");
    translate([0*global_min_clearance,0,adjustment_band_w/2]) watchstrap_adjustment_band(anchor_hole_d=0.0,band_offset=spin_offset);
    translate([0*global_min_clearance,adjustment_band_bend_r-buckle_band_bend_r,buckle_band_w/2]) rotate([0,180,0]) watchstrap_buckle_band(anchor_hole_d=0.0,band_offset=-spin_offset);
    translate([free_loop_inner_h/2+free_loop_surface_wall_th,adjustment_band_bend_r,0]) watchstrap_free_loop();
}

if(test_module=="test shapeways") {
    anchor_hole_pos=circle_point_at_length(adjustment_band_bend_r,adjustment_band_w/2,rotate=-90,offset=[0,adjustment_band_bend_r]);
    echo("Testing plating for Shapeways printing");
    translate([global_min_clearance,0,adjustment_band_w/2]) watchstrap_adjustment_band(band_offset=0);
    translate([global_min_clearance,free_loop_inner_h,buckle_band_w/2]) rotate([0,180,0]) watchstrap_buckle_band(band_offset=0,overhang_angle=0);
    translate(anchor_hole_pos) translate([0,2*free_loop_l,free_loop_inner_w/2]) rotate([90,0,0]) watchstrap_free_loop();
    translate(anchor_hole_pos) union() {
        translate([0,-free_loop_inner_h,adjustment_band_w/2]) rotate([0,45,0]) union() {
            cube([free_loop_l,2*global_min_wall_th,2*global_min_wall_th],center=true);
            cube([2*global_min_wall_th,2*global_min_wall_th,free_loop_l],center=true);
        }            
        hull() {
            translate([0,-free_loop_inner_h,adjustment_band_w/2]) cube(2*global_min_wall_th,center=true);
            translate([0,2*free_loop_l+2*global_min_clearance+global_min_wall_th,adjustment_band_w/2]) cube(2*global_min_wall_th,center=true);
        }
        translate([0,2*free_loop_l+2*global_min_clearance+global_min_wall_th,adjustment_band_w/2]) rotate([0,45,0]) union() {
            cube([free_loop_l,2*global_min_wall_th,2*global_min_wall_th],center=true);
            cube([2*global_min_wall_th,2*global_min_wall_th,free_loop_l],center=true);
        }
    }
}
